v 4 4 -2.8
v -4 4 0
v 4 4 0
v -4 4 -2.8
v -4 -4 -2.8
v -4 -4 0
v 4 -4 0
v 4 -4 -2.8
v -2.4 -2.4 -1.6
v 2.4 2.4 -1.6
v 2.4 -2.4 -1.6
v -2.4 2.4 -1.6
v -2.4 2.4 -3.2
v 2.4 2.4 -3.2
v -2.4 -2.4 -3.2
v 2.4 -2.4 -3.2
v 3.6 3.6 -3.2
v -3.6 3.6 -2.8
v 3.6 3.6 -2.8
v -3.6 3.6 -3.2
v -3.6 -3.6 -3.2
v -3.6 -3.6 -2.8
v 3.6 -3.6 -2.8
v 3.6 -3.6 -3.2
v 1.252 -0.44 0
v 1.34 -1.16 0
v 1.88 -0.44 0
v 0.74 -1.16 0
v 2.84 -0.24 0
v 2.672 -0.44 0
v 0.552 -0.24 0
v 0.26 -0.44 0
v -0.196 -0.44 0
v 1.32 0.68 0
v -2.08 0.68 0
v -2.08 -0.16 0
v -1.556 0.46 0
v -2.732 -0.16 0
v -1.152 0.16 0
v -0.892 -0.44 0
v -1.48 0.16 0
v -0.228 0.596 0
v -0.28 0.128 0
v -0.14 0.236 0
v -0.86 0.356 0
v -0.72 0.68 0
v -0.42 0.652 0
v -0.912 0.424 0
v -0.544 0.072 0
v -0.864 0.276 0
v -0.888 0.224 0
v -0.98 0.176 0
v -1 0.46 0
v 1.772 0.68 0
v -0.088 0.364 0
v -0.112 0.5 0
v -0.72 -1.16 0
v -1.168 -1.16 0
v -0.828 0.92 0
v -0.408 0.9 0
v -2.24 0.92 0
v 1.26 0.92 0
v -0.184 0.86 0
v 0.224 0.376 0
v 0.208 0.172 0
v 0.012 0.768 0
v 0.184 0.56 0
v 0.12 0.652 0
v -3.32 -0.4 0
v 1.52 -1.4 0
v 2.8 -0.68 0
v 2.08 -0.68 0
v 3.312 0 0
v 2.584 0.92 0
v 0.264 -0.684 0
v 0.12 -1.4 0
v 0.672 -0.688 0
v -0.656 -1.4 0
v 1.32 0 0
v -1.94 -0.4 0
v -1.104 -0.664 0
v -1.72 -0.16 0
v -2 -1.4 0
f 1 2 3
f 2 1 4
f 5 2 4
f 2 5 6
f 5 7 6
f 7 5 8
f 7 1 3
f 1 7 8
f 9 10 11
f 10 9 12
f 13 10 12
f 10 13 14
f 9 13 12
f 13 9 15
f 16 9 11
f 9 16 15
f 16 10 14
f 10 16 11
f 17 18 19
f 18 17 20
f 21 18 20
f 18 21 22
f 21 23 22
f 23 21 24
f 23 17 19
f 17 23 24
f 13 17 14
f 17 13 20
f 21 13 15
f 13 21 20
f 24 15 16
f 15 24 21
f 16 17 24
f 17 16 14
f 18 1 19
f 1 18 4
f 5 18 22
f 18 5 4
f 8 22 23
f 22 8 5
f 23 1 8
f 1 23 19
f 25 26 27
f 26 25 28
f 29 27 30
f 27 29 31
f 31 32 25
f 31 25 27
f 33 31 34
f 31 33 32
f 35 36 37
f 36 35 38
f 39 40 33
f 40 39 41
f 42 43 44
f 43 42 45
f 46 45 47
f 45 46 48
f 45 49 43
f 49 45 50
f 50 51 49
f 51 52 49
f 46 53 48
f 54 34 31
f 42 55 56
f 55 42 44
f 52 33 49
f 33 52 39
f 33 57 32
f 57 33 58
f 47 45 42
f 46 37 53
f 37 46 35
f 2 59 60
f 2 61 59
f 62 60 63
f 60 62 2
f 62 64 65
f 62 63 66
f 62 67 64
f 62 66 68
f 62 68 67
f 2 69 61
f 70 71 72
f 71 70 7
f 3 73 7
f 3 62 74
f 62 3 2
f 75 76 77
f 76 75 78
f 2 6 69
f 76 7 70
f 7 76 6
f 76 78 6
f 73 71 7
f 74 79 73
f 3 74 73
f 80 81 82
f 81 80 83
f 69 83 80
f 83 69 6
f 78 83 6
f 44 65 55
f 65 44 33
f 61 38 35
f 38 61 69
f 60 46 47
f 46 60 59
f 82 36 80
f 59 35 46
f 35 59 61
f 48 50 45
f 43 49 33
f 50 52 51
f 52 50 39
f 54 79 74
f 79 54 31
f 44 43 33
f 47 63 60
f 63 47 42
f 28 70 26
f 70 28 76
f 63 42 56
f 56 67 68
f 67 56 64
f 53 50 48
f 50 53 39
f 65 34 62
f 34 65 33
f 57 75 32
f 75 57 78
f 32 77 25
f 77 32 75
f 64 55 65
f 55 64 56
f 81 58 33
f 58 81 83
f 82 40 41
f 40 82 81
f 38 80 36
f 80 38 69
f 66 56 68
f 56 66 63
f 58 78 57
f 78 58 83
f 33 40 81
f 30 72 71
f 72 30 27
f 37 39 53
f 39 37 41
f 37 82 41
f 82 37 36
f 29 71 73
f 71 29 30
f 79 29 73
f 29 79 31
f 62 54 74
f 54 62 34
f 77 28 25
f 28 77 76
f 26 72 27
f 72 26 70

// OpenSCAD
// file: ../p/4-4edge.scad
use <../lib.scad>
$fa=1; $fs=0.2;
function ldraw_lib__4_4edge(realsolid=false) = [
// 0 Circle 1.0
// 0 Name: 4-4edge.dat
// 0 Author: James Jessiman
// 0 !LDRAW_ORG Primitive UPDATE 2017-01
// 0 !LICENSE Licensed under CC BY 2.0 and CC BY 4.0 : see CAreadme.txt
// 
// 0 BFC CERTIFY CCW
  [0,"BFC","CERTIFY"],
  [0,"BFC","CCW"],
// 
// 0 !HISTORY 1998-12-15 [PTadmin] Official Update 1998-10
// 0 !HISTORY 2005-12-28 [PTadmin] Official Update 2005-01
// 0 !HISTORY 2007-06-24 [PTadmin] Header formatted for Contributor Agreement
// 0 !HISTORY 2008-07-01 [PTadmin] Official Update 2008-01
// 0 !HISTORY 2017-01-15 [Steffen] BFCed
// 0 !HISTORY 2017-12-30 [PTadmin] Official Update 2017-01
// 
// 
// 2 24 1 0 0 0.9239 0 0.3827
  [2,24,1,0,0,0.9239,0,0.3827],
// 2 24 0.9239 0 0.3827 0.7071 0 0.7071
  [2,24,0.9239,0,0.3827,0.7071,0,0.7071],
// 2 24 0.7071 0 0.7071 0.3827 0 0.9239
  [2,24,0.7071,0,0.7071,0.3827,0,0.9239],
// 2 24 0.3827 0 0.9239 0 0 1
  [2,24,0.3827,0,0.9239,0,0,1],
// 2 24 0 0 1 -0.3827 0 0.9239
  [2,24,0,0,1,-0.3827,0,0.9239],
// 2 24 -0.3827 0 0.9239 -0.7071 0 0.7071
  [2,24,-0.3827,0,0.9239,-0.7071,0,0.7071],
// 2 24 -0.7071 0 0.7071 -0.9239 0 0.3827
  [2,24,-0.7071,0,0.7071,-0.9239,0,0.3827],
// 2 24 -0.9239 0 0.3827 -1 0 -0
  [2,24,-0.9239,0,0.3827,-1,0,-0],
// 2 24 -1 0 -0 -0.9239 0 -0.3827
  [2,24,-1,0,-0,-0.9239,0,-0.3827],
// 2 24 -0.9239 0 -0.3827 -0.7071 0 -0.7071
  [2,24,-0.9239,0,-0.3827,-0.7071,0,-0.7071],
// 2 24 -0.7071 0 -0.7071 -0.3827 0 -0.9239
  [2,24,-0.7071,0,-0.7071,-0.3827,0,-0.9239],
// 2 24 -0.3827 0 -0.9239 0 0 -1
  [2,24,-0.3827,0,-0.9239,0,0,-1],
// 2 24 0 0 -1 0.3827 0 -0.9239
  [2,24,0,0,-1,0.3827,0,-0.9239],
// 2 24 0.3827 0 -0.9239 0.7071 0 -0.7071
  [2,24,0.3827,0,-0.9239,0.7071,0,-0.7071],
// 2 24 0.7071 0 -0.7071 0.9239 0 -0.3827
  [2,24,0.7071,0,-0.7071,0.9239,0,-0.3827],
// 2 24 0.9239 0 -0.3827 1 0 0
  [2,24,0.9239,0,-0.3827,1,0,0],
];
module ldraw_lib__4_4edge(step=0, col=false, unit=2/5, alt=false, line=0.2, solid=!$preview)
    makepoly(ldraw_lib__4_4edge(solid), step=step, col=col, unit=unit, alt=alt, line=line, solid=solid);
ldraw_lib__4_4edge(line=0.2);
// file: ../p/4-4disc.scad
use <../lib.scad>
$fa=1; $fs=0.2;
function ldraw_lib__4_4disc(realsolid=false) = [
// 0 Disc 1.0
// 0 Name: 4-4disc.dat
// 0 Author: James Jessiman
// 0 !LDRAW_ORG Primitive UPDATE 2002-02
// 0 !LICENSE Licensed under CC BY 2.0 and CC BY 4.0 : see CAreadme.txt
// 
// 0 BFC CERTIFY CCW
  [0,"BFC","CERTIFY"],
  [0,"BFC","CCW"],
// 
// 0 !HISTORY 1998-12-15 [PTadmin] Official Update 1998-10
// 0 !HISTORY 2002-03-23 [sbliss] Added BFC statement
// 0 !HISTORY 2002-04-25 [PTadmin] Official Update 2002-02
// 0 !HISTORY 2007-06-24 [PTadmin] Header formatted for Contributor Agreement
// 0 !HISTORY 2008-07-01 [PTadmin] Official Update 2008-01
// 
// 
// 3 16 0 0 0 1 0 0 0.9239 0 0.3827
  [3,16,0,0,0,1,0,0,0.9239,0,0.3827],
// 3 16 0 0 0 0.9239 0 0.3827 0.7071 0 0.7071
  [3,16,0,0,0,0.9239,0,0.3827,0.7071,0,0.7071],
// 3 16 0 0 0 0.7071 0 0.7071 0.3827 0 0.9239
  [3,16,0,0,0,0.7071,0,0.7071,0.3827,0,0.9239],
// 3 16 0 0 0 0.3827 0 0.9239 0 0 1
  [3,16,0,0,0,0.3827,0,0.9239,0,0,1],
// 3 16 0 0 0 0 0 1 -0.3827 0 0.9239
  [3,16,0,0,0,0,0,1,-0.3827,0,0.9239],
// 3 16 0 0 0 -0.3827 0 0.9239 -0.7071 0 0.7071
  [3,16,0,0,0,-0.3827,0,0.9239,-0.7071,0,0.7071],
// 3 16 0 0 0 -0.7071 0 0.7071 -0.9239 0 0.3827
  [3,16,0,0,0,-0.7071,0,0.7071,-0.9239,0,0.3827],
// 3 16 0 0 0 -0.9239 0 0.3827 -1 0 -0
  [3,16,0,0,0,-0.9239,0,0.3827,-1,0,-0],
// 3 16 0 0 0 -1 0 -0 -0.9239 0 -0.3827
  [3,16,0,0,0,-1,0,-0,-0.9239,0,-0.3827],
// 3 16 0 0 0 -0.9239 0 -0.3827 -0.7071 0 -0.7071
  [3,16,0,0,0,-0.9239,0,-0.3827,-0.7071,0,-0.7071],
// 3 16 0 0 0 -0.7071 0 -0.7071 -0.3827 0 -0.9239
  [3,16,0,0,0,-0.7071,0,-0.7071,-0.3827,0,-0.9239],
// 3 16 0 0 0 -0.3827 0 -0.9239 0 0 -1
  [3,16,0,0,0,-0.3827,0,-0.9239,0,0,-1],
// 3 16 0 0 0 0 0 -1 0.3827 0 -0.9239
  [3,16,0,0,0,0,0,-1,0.3827,0,-0.9239],
// 3 16 0 0 0 0.3827 0 -0.9239 0.7071 0 -0.7071
  [3,16,0,0,0,0.3827,0,-0.9239,0.7071,0,-0.7071],
// 3 16 0 0 0 0.7071 0 -0.7071 0.9239 0 -0.3827
  [3,16,0,0,0,0.7071,0,-0.7071,0.9239,0,-0.3827],
// 3 16 0 0 0 0.9239 0 -0.3827 1 0 0
  [3,16,0,0,0,0.9239,0,-0.3827,1,0,0],
// 0
];
module ldraw_lib__4_4disc(step=0, col=false, unit=2/5, alt=false, line=0.2, solid=!$preview)
    makepoly(ldraw_lib__4_4disc(solid), step=step, col=col, unit=unit, alt=alt, line=line, solid=solid);
ldraw_lib__4_4disc(line=0.2);
// file: ../p/4-4cyli.scad
use <../lib.scad>
$fa=1; $fs=0.2;
function ldraw_lib__4_4cyli(realsolid=false) = [
// 0 Cylinder 1.0
// 0 Name: 4-4cyli.dat
// 0 Author: James Jessiman
// 0 !LDRAW_ORG Primitive UPDATE 2005-01
// 0 !LICENSE Licensed under CC BY 2.0 and CC BY 4.0 : see CAreadme.txt
// 
// 0 BFC CERTIFY CCW
  [0,"BFC","CERTIFY"],
  [0,"BFC","CCW"],
// 
// 0 !HISTORY 1998-12-15 [PTadmin] Official Update 1998-10
// 0 !HISTORY 2002-03-23 [sbliss] Added BFC statement; merged headers from files in distributions LDraw 0.27 and Complete.
// 0 !HISTORY 2002-04-25 [PTadmin] Official Update 2002-02
// 0 !HISTORY 2004-12-14 [guyvivan] BFC CCW
// 0 !HISTORY 2005-12-28 [PTadmin] Official Update 2005-01
// 0 !HISTORY 2007-06-24 [PTadmin] Header formatted for Contributor Agreement
// 0 !HISTORY 2008-07-01 [PTadmin] Official Update 2008-01
// 
// 
// 4 16 1 1 0 0.9239 1 0.3827 0.9239 0 0.3827 1 0 0
  [4,16,1,1,0,0.9239,1,0.3827,0.9239,0,0.3827,1,0,0],
// 5 24 1 0 0 1 1 0 0.9239 0 0.3827 0.9239 0 -0.3827
  [5,24,1,0,0,1,1,0,0.9239,0,0.3827,0.9239,0,-0.3827],
// 4 16 0.9239 1 0.3827 0.7071 1 0.7071 0.7071 0 0.7071 0.9239 0 0.3827
  [4,16,0.9239,1,0.3827,0.7071,1,0.7071,0.7071,0,0.7071,0.9239,0,0.3827],
// 5 24 0.9239 0 0.3827 0.9239 1 0.3827 0.7071 0 0.7071 1 0 0
  [5,24,0.9239,0,0.3827,0.9239,1,0.3827,0.7071,0,0.7071,1,0,0],
// 4 16 0.7071 1 0.7071 0.3827 1 0.9239 0.3827 0 0.9239 0.7071 0 0.7071
  [4,16,0.7071,1,0.7071,0.3827,1,0.9239,0.3827,0,0.9239,0.7071,0,0.7071],
// 5 24 0.7071 0 0.7071 0.7071 1 0.7071 0.3827 0 0.9239 0.9239 0 0.3827
  [5,24,0.7071,0,0.7071,0.7071,1,0.7071,0.3827,0,0.9239,0.9239,0,0.3827],
// 4 16 0.3827 1 0.9239 0 1 1 0 0 1 0.3827 0 0.9239
  [4,16,0.3827,1,0.9239,0,1,1,0,0,1,0.3827,0,0.9239],
// 5 24 0.3827 0 0.9239 0.3827 1 0.9239 0 0 1 0.7071 0 0.7071
  [5,24,0.3827,0,0.9239,0.3827,1,0.9239,0,0,1,0.7071,0,0.7071],
// 4 16 0 1 1 -0.3827 1 0.9239 -0.3827 0 0.9239 0 0 1
  [4,16,0,1,1,-0.3827,1,0.9239,-0.3827,0,0.9239,0,0,1],
// 5 24 0 0 1 0 1 1 -0.3827 0 0.9239 0.3827 0 0.9239
  [5,24,0,0,1,0,1,1,-0.3827,0,0.9239,0.3827,0,0.9239],
// 4 16 -0.3827 1 0.9239 -0.7071 1 0.7071 -0.7071 0 0.7071 -0.3827 0 0.9239
  [4,16,-0.3827,1,0.9239,-0.7071,1,0.7071,-0.7071,0,0.7071,-0.3827,0,0.9239],
// 5 24 -0.3827 0 0.9239 -0.3827 1 0.9239 -0.7071 0 0.7071 0 0 1
  [5,24,-0.3827,0,0.9239,-0.3827,1,0.9239,-0.7071,0,0.7071,0,0,1],
// 4 16 -0.7071 1 0.7071 -0.9239 1 0.3827 -0.9239 0 0.3827 -0.7071 0 0.7071
  [4,16,-0.7071,1,0.7071,-0.9239,1,0.3827,-0.9239,0,0.3827,-0.7071,0,0.7071],
// 5 24 -0.7071 0 0.7071 -0.7071 1 0.7071 -0.9239 0 0.3827 -0.3827 0 0.9239
  [5,24,-0.7071,0,0.7071,-0.7071,1,0.7071,-0.9239,0,0.3827,-0.3827,0,0.9239],
// 4 16 -0.9239 1 0.3827 -1 1 0 -1 0 0 -0.9239 0 0.3827
  [4,16,-0.9239,1,0.3827,-1,1,0,-1,0,0,-0.9239,0,0.3827],
// 5 24 -0.9239 0 0.3827 -0.9239 1 0.3827 -1 0 0 -0.7071 0 0.7071
  [5,24,-0.9239,0,0.3827,-0.9239,1,0.3827,-1,0,0,-0.7071,0,0.7071],
// 4 16 -1 1 0 -0.9239 1 -0.3827 -0.9239 0 -0.3827 -1 0 0
  [4,16,-1,1,0,-0.9239,1,-0.3827,-0.9239,0,-0.3827,-1,0,0],
// 5 24 -1 0 0 -1 1 0 -0.9239 0 -0.3827 -0.9239 0 0.3827
  [5,24,-1,0,0,-1,1,0,-0.9239,0,-0.3827,-0.9239,0,0.3827],
// 4 16 -0.9239 1 -0.3827 -0.7071 1 -0.7071 -0.7071 0 -0.7071 -0.9239 0 -0.3827
  [4,16,-0.9239,1,-0.3827,-0.7071,1,-0.7071,-0.7071,0,-0.7071,-0.9239,0,-0.3827],
// 5 24 -0.9239 0 -0.3827 -0.9239 1 -0.3827 -0.7071 0 -0.7071 -1 0 0
  [5,24,-0.9239,0,-0.3827,-0.9239,1,-0.3827,-0.7071,0,-0.7071,-1,0,0],
// 4 16 -0.7071 1 -0.7071 -0.3827 1 -0.9239 -0.3827 0 -0.9239 -0.7071 0 -0.7071
  [4,16,-0.7071,1,-0.7071,-0.3827,1,-0.9239,-0.3827,0,-0.9239,-0.7071,0,-0.7071],
// 5 24 -0.7071 0 -0.7071 -0.7071 1 -0.7071 -0.3827 0 -0.9239 -0.9239 0 -0.3827
  [5,24,-0.7071,0,-0.7071,-0.7071,1,-0.7071,-0.3827,0,-0.9239,-0.9239,0,-0.3827],
// 4 16 -0.3827 1 -0.9239 0 1 -1 0 0 -1 -0.3827 0 -0.9239
  [4,16,-0.3827,1,-0.9239,0,1,-1,0,0,-1,-0.3827,0,-0.9239],
// 5 24 -0.3827 0 -0.9239 -0.3827 1 -0.9239 0 0 -1 -0.7071 0 -0.7071
  [5,24,-0.3827,0,-0.9239,-0.3827,1,-0.9239,0,0,-1,-0.7071,0,-0.7071],
// 4 16 0 1 -1 0.3827 1 -0.9239 0.3827 0 -0.9239 0 0 -1
  [4,16,0,1,-1,0.3827,1,-0.9239,0.3827,0,-0.9239,0,0,-1],
// 5 24 0 0 -1 0 1 -1 0.3827 0 -0.9239 -0.3827 0 -0.9239
  [5,24,0,0,-1,0,1,-1,0.3827,0,-0.9239,-0.3827,0,-0.9239],
// 4 16 0.3827 1 -0.9239 0.7071 1 -0.7071 0.7071 0 -0.7071 0.3827 0 -0.9239
  [4,16,0.3827,1,-0.9239,0.7071,1,-0.7071,0.7071,0,-0.7071,0.3827,0,-0.9239],
// 5 24 0.3827 0 -0.9239 0.3827 1 -0.9239 0.7071 0 -0.7071 0 0 -1
  [5,24,0.3827,0,-0.9239,0.3827,1,-0.9239,0.7071,0,-0.7071,0,0,-1],
// 4 16 0.7071 1 -0.7071 0.9239 1 -0.3827 0.9239 0 -0.3827 0.7071 0 -0.7071
  [4,16,0.7071,1,-0.7071,0.9239,1,-0.3827,0.9239,0,-0.3827,0.7071,0,-0.7071],
// 5 24 0.7071 0 -0.7071 0.7071 1 -0.7071 0.9239 0 -0.3827 0.3827 0 -0.9239
  [5,24,0.7071,0,-0.7071,0.7071,1,-0.7071,0.9239,0,-0.3827,0.3827,0,-0.9239],
// 4 16 0.9239 1 -0.3827 1 1 0 1 0 0 0.9239 0 -0.3827
  [4,16,0.9239,1,-0.3827,1,1,0,1,0,0,0.9239,0,-0.3827],
// 5 24 0.9239 0 -0.3827 0.9239 1 -0.3827 1 0 0 0.7071 0 -0.7071
  [5,24,0.9239,0,-0.3827,0.9239,1,-0.3827,1,0,0,0.7071,0,-0.7071],
// 0
];
module ldraw_lib__4_4cyli(step=0, col=false, unit=2/5, alt=false, line=0.2, solid=!$preview)
    makepoly(ldraw_lib__4_4cyli(solid), step=step, col=col, unit=unit, alt=alt, line=line, solid=solid);
ldraw_lib__4_4cyli(line=0.2);
// file: ../p/stud3.scad
use <../lib.scad>
use <4-4cyli.scad>
use <4-4disc.scad>
use <4-4edge.scad>
$fa=1; $fs=0.2;
function ldraw_lib__stud3(realsolid=false) = realsolid ? 
    [openscad(translate([0,0,-eps()], o=cylinder(4+eps(), r=4)),2)] : [
// 0 Stud Tube Solid
// 0 Name: stud3.dat
// 0 Author: James Jessiman
// 0 !LDRAW_ORG Primitive UPDATE 2012-01
// 0 !LICENSE Licensed under CC BY 2.0 and CC BY 4.0 : see CAreadme.txt
// 
// 0 BFC CERTIFY CCW
  [0,"BFC","CERTIFY"],
  [0,"BFC","CCW"],
// 
// 0 !HISTORY 2002-04-04 [sbliss] Modified for BFC compliance
// 0 !HISTORY 2002-04-25 [PTadmin] Official Update 2002-02
// 0 !HISTORY 2007-06-24 [PTadmin] Header formatted for Contributor Agreement
// 0 !HISTORY 2008-07-01 [PTadmin] Official Update 2008-01
// 0 !HISTORY 2012-02-16 [Philo] Changed to CCW
// 0 !HISTORY 2012-03-30 [PTadmin] Official Update 2012-01
// 
// 
// 1 16 0 -4 0 4 0 0 0 1 0 0 0 4 4-4edge.dat
  [1,16,0,-4,0,4,0,0,0,1,0,0,0,4, ldraw_lib__4_4edge(realsolid)],
// 1 16 0 0 0 4 0 0 0 1 0 0 0 4 4-4edge.dat
  [1,16,0,0,0,4,0,0,0,1,0,0,0,4, ldraw_lib__4_4edge(realsolid)],
// 1 16 0 -4 0 4 0 0 0 1 0 0 0 4 4-4disc.dat
  [1,16,0,-4,0,4,0,0,0,1,0,0,0,4, ldraw_lib__4_4disc(realsolid)],
// 1 16 0 -4 0 4 0 0 0 4 0 0 0 4 4-4cyli.dat
  [1,16,0,-4,0,4,0,0,0,4,0,0,0,4, ldraw_lib__4_4cyli(realsolid)],
];
module ldraw_lib__stud3(step=0, col=false, unit=2/5, alt=false, line=0.2, solid=!$preview)
    makepoly(ldraw_lib__stud3(solid), step=step, col=col, unit=unit, alt=alt, line=line, solid=solid);
ldraw_lib__stud3(line=0.2);
// file: ../p/stud.scad
use <../lib.scad>
use <4-4cyli.scad>
use <4-4disc.scad>
use <4-4edge.scad>
$fa=1; $fs=0.2;
function ldraw_lib__stud(realsolid=false) = realsolid ? 
    [openscad(translate([0,0,-eps()], o=cylinder(4+eps(), r=6)),2)] : [
// 0 Stud
// 0 Name: stud.dat
// 0 Author: James Jessiman
// 0 !LDRAW_ORG Primitive UPDATE 2012-01
// 0 !LICENSE Licensed under CC BY 2.0 and CC BY 4.0 : see CAreadme.txt
// 
// 0 BFC CERTIFY CCW
  [0,"BFC","CERTIFY"],
  [0,"BFC","CCW"],
// 
// 0 !HISTORY 2002-04-04 [sbliss] Modified for BFC compliance
// 0 !HISTORY 2002-04-25 [PTadmin] Official Update 2002-02
// 0 !HISTORY 2007-06-24 [PTadmin] Header formatted for Contributor Agreement
// 0 !HISTORY 2008-07-01 [PTadmin] Official Update 2008-01
// 0 !HISTORY 2012-02-16 [Philo] Changed to CCW
// 0 !HISTORY 2012-03-30 [PTadmin] Official Update 2012-01
// 
// 
// 1 16 0 0 0 6 0 0 0 1 0 0 0 6 4-4edge.dat
  [1,16,0,0,0,6,0,0,0,1,0,0,0,6, ldraw_lib__4_4edge(realsolid)],
// 1 16 0 -4 0 6 0 0 0 1 0 0 0 6 4-4edge.dat
  [1,16,0,-4,0,6,0,0,0,1,0,0,0,6, ldraw_lib__4_4edge(realsolid)],
// 1 16 0 0 0 6 0 0 0 -4 0 0 0 6 4-4cyli.dat
  [1,16,0,0,0,6,0,0,0,-4,0,0,0,6, ldraw_lib__4_4cyli(realsolid)],
// 1 16 0 -4 0 6 0 0 0 1 0 0 0 6 4-4disc.dat
  [1,16,0,-4,0,6,0,0,0,1,0,0,0,6, ldraw_lib__4_4disc(realsolid)],
];
module ldraw_lib__stud(step=0, col=false, unit=2/5, alt=false, line=0.2, solid=!$preview)
    makepoly(ldraw_lib__stud(solid), step=step, col=col, unit=unit, alt=alt, line=line, solid=solid);
ldraw_lib__stud(line=0.2);
// file: ../p/box4t.scad
use <../lib.scad>
$fa=1; $fs=0.2;
function ldraw_lib__box4t(realsolid=false) = [
// 0 Box with 4 Adjacent Faces and All Edges
// 0 Name: box4t.dat
// 0 Author: Tore Eriksson [Tore_Eriksson]
// 0 !LDRAW_ORG Primitive UPDATE 2003-02
// 0 !LICENSE Licensed under CC BY 2.0 and CC BY 4.0 : see CAreadme.txt
// 
// 0 BFC CERTIFY CCW
  [0,"BFC","CERTIFY"],
  [0,"BFC","CCW"],
// 
// 0 !HISTORY 1997-09-29 [PTadmin] Official Update 1997-15
// 0 !HISTORY 2002-08-31 [izanette] Modified with WINDZ for BFC compliance
// 0 !HISTORY 2003-08-01 [PTadmin] Official Update 2003-02
// 0 !HISTORY 2007-06-24 [PTadmin] Header formatted for Contributor Agreement
// 0 !HISTORY 2008-07-01 [PTadmin] Official Update 2008-01
// 
// 
// 2 24 1 1 1 -1 1 1
  [2,24,1,1,1,-1,1,1],
// 2 24 -1 1 1 -1 1 -1
  [2,24,-1,1,1,-1,1,-1],
// 2 24 -1 1 -1 1 1 -1
  [2,24,-1,1,-1,1,1,-1],
// 2 24 1 1 -1 1 1 1
  [2,24,1,1,-1,1,1,1],
// 2 24 1 0 1 -1 0 1
  [2,24,1,0,1,-1,0,1],
// 2 24 -1 0 1 -1 0 -1
  [2,24,-1,0,1,-1,0,-1],
// 2 24 -1 0 -1 1 0 -1
  [2,24,-1,0,-1,1,0,-1],
// 2 24 1 0 -1 1 0 1
  [2,24,1,0,-1,1,0,1],
// 2 24 1 0 1 1 1 1
  [2,24,1,0,1,1,1,1],
// 2 24 -1 0 1 -1 1 1
  [2,24,-1,0,1,-1,1,1],
// 2 24 1 0 -1 1 1 -1
  [2,24,1,0,-1,1,1,-1],
// 2 24 -1 0 -1 -1 1 -1
  [2,24,-1,0,-1,-1,1,-1],
// 4 16 1 1 1 1 1 -1 -1 1 -1 -1 1 1
  [4,16,1,1,1,1,1,-1,-1,1,-1,-1,1,1],
// 4 16 1 1 1 -1 1 1 -1 0 1 1 0 1
  [4,16,1,1,1,-1,1,1,-1,0,1,1,0,1],
// 4 16 -1 1 1 -1 1 -1 -1 0 -1 -1 0 1
  [4,16,-1,1,1,-1,1,-1,-1,0,-1,-1,0,1],
// 0 4 16 -1 1 -1 -1 0 -1 1 0 -1 1 1 -1
// 4 16 1 1 -1 1 1 1 1 0 1 1 0 -1
  [4,16,1,1,-1,1,1,1,1,0,1,1,0,-1],
// 0
];
module ldraw_lib__box4t(step=0, col=false, unit=2/5, alt=false, line=0.2, solid=!$preview)
    makepoly(ldraw_lib__box4t(solid), step=step, col=col, unit=unit, alt=alt, line=line, solid=solid);
ldraw_lib__box4t(line=0.2);
// file: s/3004s01.scad
use <../../lib.scad>
use <../../p/box4t.scad>
use <../../p/box5.scad>
use <../../p/stud.scad>
use <../../p/stud3.scad>
$fa=1; $fs=0.2;
function ldraw_lib__s__3004s01(realsolid=false) = [
// 0 ~Brick  1 x  2 without Front Face
// 0 Name: s\3004s01.dat
// 0 Author: James Jessiman
// 0 !LDRAW_ORG Subpart UPDATE 2003-03
// 0 !LICENSE Licensed under CC BY 2.0 and CC BY 4.0 : see CAreadme.txt
// 
// 0 BFC CERTIFY CCW
  [0,"BFC","CERTIFY"],
  [0,"BFC","CCW"],
// 
// 0 !HISTORY 2003-09-07 [jriley] Subfiling, BFC
// 0 !HISTORY 2003-12-19 [PTadmin] Official Update 2003-03
// 0 !HISTORY 2007-08-29 [PTadmin] Header formatted for Contributor Agreement
// 0 !HISTORY 2008-07-01 [PTadmin] Official Update 2008-01
// 
// 
// 1 16 0 4 0 1 0 0 0 -5 0 0 0 1 stud3.dat
  [1,16,0,4,0,1,0,0,0,-5,0,0,0,1, ldraw_lib__stud3(realsolid)],
// 0 BFC INVERTNEXT
  [0,"BFC","INVERTNEXT"],
// 1 16 0 24 0 16 0 0 0 -20 0 0 0 6 box5.dat
  [1,16,0,24,0,16,0,0,0,-20,0,0,0,6, ldraw_lib__box5(realsolid)],
// 4 16 20 24 10 16 24 6 -16 24 6 -20 24 10
  [4,16,20,24,10,16,24,6,-16,24,6,-20,24,10],
// 4 16 -20 24 10 -16 24 6 -16 24 -6 -20 24 -10
  [4,16,-20,24,10,-16,24,6,-16,24,-6,-20,24,-10],
// 4 16 -20 24 -10 -16 24 -6 16 24 -6 20 24 -10
  [4,16,-20,24,-10,-16,24,-6,16,24,-6,20,24,-10],
// 4 16 20 24 -10 16 24 -6 16 24 6 20 24 10
  [4,16,20,24,-10,16,24,-6,16,24,6,20,24,10],
// 1 16 0 24 0 20 0 0 0 -24 0 0 0 10 box4t.dat
  [1,16,0,24,0,20,0,0,0,-24,0,0,0,10, ldraw_lib__box4t(realsolid)],
// 1 16 10 0 0 1 0 0 0 1 0 0 0 1 stud.dat
  [1,16,10,0,0,1,0,0,0,1,0,0,0,1, ldraw_lib__stud(realsolid)],
// 1 16 -10 0 0 1 0 0 0 1 0 0 0 1 stud.dat
  [1,16,-10,0,0,1,0,0,0,1,0,0,0,1, ldraw_lib__stud(realsolid)],
// 0
];
module ldraw_lib__s__3004s01(step=0, col=false, unit=2/5, alt=false, line=0.2, solid=!$preview)
    makepoly(ldraw_lib__s__3004s01(solid), step=step, col=col, unit=unit, alt=alt, line=line, solid=solid);
ldraw_lib__s__3004s01(line=0.2);
// file: ../p/box5.scad
use <../lib.scad>
$fa=1; $fs=0.2;
function ldraw_lib__box5(realsolid=false) = [
// 0 Box with 5 Faces and All Edges
// 0 Name: box5.dat
// 0 Author: James Jessiman
// 0 !LDRAW_ORG Primitive UPDATE 2012-01
// 0 !LICENSE Licensed under CC BY 2.0 and CC BY 4.0 : see CAreadme.txt
// 
// 0 BFC CERTIFY CCW
  [0,"BFC","CERTIFY"],
  [0,"BFC","CCW"],
// 
// 0 !HISTORY 2002-04-03 [sbliss] Modified for BFC compliance
// 0 !HISTORY 2002-04-25 [PTadmin] Official Update 2002-02
// 0 !HISTORY 2007-06-24 [PTadmin] Header formatted for Contributor Agreement
// 0 !HISTORY 2008-07-01 [PTadmin] Official Update 2008-01
// 0 !HISTORY 2012-02-16 [Philo] Changed to CCW
// 0 !HISTORY 2012-03-30 [PTadmin] Official Update 2012-01
// 
// 
// 2 24 1 1 1 -1 1 1
  [2,24,1,1,1,-1,1,1],
// 2 24 -1 1 1 -1 1 -1
  [2,24,-1,1,1,-1,1,-1],
// 2 24 -1 1 -1 1 1 -1
  [2,24,-1,1,-1,1,1,-1],
// 2 24 1 1 -1 1 1 1
  [2,24,1,1,-1,1,1,1],
// 2 24 1 0 1 -1 0 1
  [2,24,1,0,1,-1,0,1],
// 2 24 -1 0 1 -1 0 -1
  [2,24,-1,0,1,-1,0,-1],
// 2 24 -1 0 -1 1 0 -1
  [2,24,-1,0,-1,1,0,-1],
// 2 24 1 0 -1 1 0 1
  [2,24,1,0,-1,1,0,1],
// 2 24 1 0 1 1 1 1
  [2,24,1,0,1,1,1,1],
// 2 24 -1 0 1 -1 1 1
  [2,24,-1,0,1,-1,1,1],
// 2 24 1 0 -1 1 1 -1
  [2,24,1,0,-1,1,1,-1],
// 2 24 -1 0 -1 -1 1 -1
  [2,24,-1,0,-1,-1,1,-1],
// 4 16 -1 1 1 1 1 1 1 1 -1 -1 1 -1
  [4,16,-1,1,1,1,1,1,1,1,-1,-1,1,-1],
// 4 16 -1 1 1 -1 0 1 1 0 1 1 1 1
  [4,16,-1,1,1,-1,0,1,1,0,1,1,1,1],
// 4 16 -1 1 -1 -1 0 -1 -1 0 1 -1 1 1
  [4,16,-1,1,-1,-1,0,-1,-1,0,1,-1,1,1],
// 4 16 1 1 -1 1 0 -1 -1 0 -1 -1 1 -1
  [4,16,1,1,-1,1,0,-1,-1,0,-1,-1,1,-1],
// 4 16 1 1 1 1 0 1 1 0 -1 1 1 -1
  [4,16,1,1,1,1,0,1,1,0,-1,1,1,-1],
];
module ldraw_lib__box5(step=0, col=false, unit=2/5, alt=false, line=0.2, solid=!$preview)
    makepoly(ldraw_lib__box5(solid), step=step, col=col, unit=unit, alt=alt, line=line, solid=solid);
ldraw_lib__box5(line=0.2);
// file: ../p/box4.scad
use <../lib.scad>
$fa=1; $fs=0.2;
function ldraw_lib__box4(realsolid=false) = [
// 0 Box with 4 Faces (2 Parallel Pairs) and All Edges
// 0 Name: box4.dat
// 0 Author: James Jessiman
// 0 !LDRAW_ORG Primitive UPDATE 2012-01
// 0 !LICENSE Licensed under CC BY 2.0 and CC BY 4.0 : see CAreadme.txt
// 
// 0 BFC CERTIFY CCW
  [0,"BFC","CERTIFY"],
  [0,"BFC","CCW"],
// 
// 0 !HISTORY 2002-04-03 [sbliss] Modified for BFC compliance
// 0 !HISTORY 2002-04-25 [PTadmin] Official Update 2002-02
// 0 !HISTORY 2007-06-24 [PTadmin] Header formatted for Contributor Agreement
// 0 !HISTORY 2008-07-01 [PTadmin] Official Update 2008-01
// 0 !HISTORY 2012-02-16 [Philo] Changed to CCW
// 0 !HISTORY 2012-03-30 [PTadmin] Official Update 2012-01
// 
// 
// 2 24 1 1 1 -1 1 1
  [2,24,1,1,1,-1,1,1],
// 2 24 -1 1 1 -1 1 -1
  [2,24,-1,1,1,-1,1,-1],
// 2 24 -1 1 -1 1 1 -1
  [2,24,-1,1,-1,1,1,-1],
// 2 24 1 1 -1 1 1 1
  [2,24,1,1,-1,1,1,1],
// 2 24 1 0 1 -1 0 1
  [2,24,1,0,1,-1,0,1],
// 2 24 -1 0 1 -1 0 -1
  [2,24,-1,0,1,-1,0,-1],
// 2 24 -1 0 -1 1 0 -1
  [2,24,-1,0,-1,1,0,-1],
// 2 24 1 0 -1 1 0 1
  [2,24,1,0,-1,1,0,1],
// 2 24 1 0 1 1 1 1
  [2,24,1,0,1,1,1,1],
// 2 24 -1 0 1 -1 1 1
  [2,24,-1,0,1,-1,1,1],
// 2 24 1 0 -1 1 1 -1
  [2,24,1,0,-1,1,1,-1],
// 2 24 -1 0 -1 -1 1 -1
  [2,24,-1,0,-1,-1,1,-1],
// 4 16 -1 1 1 -1 0 1 1 0 1 1 1 1
  [4,16,-1,1,1,-1,0,1,1,0,1,1,1,1],
// 4 16 -1 1 -1 -1 0 -1 -1 0 1 -1 1 1
  [4,16,-1,1,-1,-1,0,-1,-1,0,1,-1,1,1],
// 4 16 1 1 -1 1 0 -1 -1 0 -1 -1 1 -1
  [4,16,1,1,-1,1,0,-1,-1,0,-1,-1,1,-1],
// 4 16 1 1 1 1 0 1 1 0 -1 1 1 -1
  [4,16,1,1,1,1,0,1,1,0,-1,1,1,-1],
];
module ldraw_lib__box4(step=0, col=false, unit=2/5, alt=false, line=0.2, solid=!$preview)
    makepoly(ldraw_lib__box4(solid), step=step, col=col, unit=unit, alt=alt, line=line, solid=solid);
ldraw_lib__box4(line=0.2);
// file: 3004.scad
use <../lib.scad>
use <s/3004s01.scad>
$fa=1; $fs=0.2;
function ldraw_lib__3004(realsolid=false) = [
// 0 Brick  1 x  2
// 0 Name: 3004.dat
// 0 Author: James Jessiman
// 0 !LDRAW_ORG Part UPDATE 2022-05
// 0 !LICENSE Licensed under CC BY 2.0 and CC BY 4.0 : see CAreadme.txt
// 
// 0 BFC CERTIFY CCW
  [0,"BFC","CERTIFY"],
  [0,"BFC","CCW"],
// 
// 0 !HISTORY 2001-10-26 [PTadmin] Official Update 2001-01
// 0 !HISTORY 2002-05-07 {unknown} BFC Certification
// 0 !HISTORY 2002-06-11 [PTadmin] Official Update 2002-03
// 0 !HISTORY 2007-05-07 [PTadmin] Header formatted for Contributor Agreement
// 0 !HISTORY 2008-07-01 [PTadmin] Official Update 2008-01
// 0 !HISTORY 2022-08-04 [MagFors] Using subfile
// 0 !HISTORY 2022-09-15 [PTadmin] Official Update 2022-05
// 
// 
// 1 16 0 0 0 1 0 0 0 1 0 0 0 1 s\3004s01.dat
  [1,16,0,0,0,1,0,0,0,1,0,0,0,1, ldraw_lib__s__3004s01(realsolid)],
// 4 16 -20 24 -10 20 24 -10 20 0 -10 -20 0 -10
  [4,16,-20,24,-10,20,24,-10,20,0,-10,-20,0,-10],
];
module ldraw_lib__3004(step=0, col=false, unit=2/5, alt=false, line=0.2, solid=!$preview)
    makepoly(ldraw_lib__3004(solid), step=step, col=col, unit=unit, alt=alt, line=line, solid=solid);
ldraw_lib__3004(line=0.2);
// file: s/3070bs01.scad
use <../../lib.scad>
use <../../p/box4.scad>
use <../../p/box5.scad>
$fa=1; $fs=0.2;
function ldraw_lib__s__3070bs01(realsolid=false) = [
// 0 ~Tile  1 x  1 with Groove without Top Face
// 0 Name: s\3070bs01.dat
// 0 Author: Chris Dee [cwdee]
// 0 !LDRAW_ORG Subpart UPDATE 2009-02
// 0 !LICENSE Licensed under CC BY 2.0 and CC BY 4.0 : see CAreadme.txt
// 
// 0 BFC CERTIFY CCW
  [0,"BFC","CERTIFY"],
  [0,"BFC","CCW"],
// 
// 0 !HISTORY 2009-09-03 [PTadmin] Official Update 2009-02
// 
// 
// 1 16 0 0 0 10 0 0 0 7 0 0 0 10 box4.dat
  [1,16,0,0,0,10,0,0,0,7,0,0,0,10, ldraw_lib__box4(realsolid)],
// 0 BFC INVERTNEXT
  [0,"BFC","INVERTNEXT"],
// 1 16 0 8 0 6 0 0 0 -4 0 0 0 6 box5.dat
  [1,16,0,8,0,6,0,0,0,-4,0,0,0,6, ldraw_lib__box5(realsolid)],
// 1 16 0 7 0 9 0 0 0 1 0 0 0 9 box4.dat
  [1,16,0,7,0,9,0,0,0,1,0,0,0,9, ldraw_lib__box4(realsolid)],
// 
// 4 16 9 8 9 6 8 6 -6 8 6 -9 8 9
  [4,16,9,8,9,6,8,6,-6,8,6,-9,8,9],
// 4 16 -9 8 9 -6 8 6 -6 8 -6 -9 8 -9
  [4,16,-9,8,9,-6,8,6,-6,8,-6,-9,8,-9],
// 4 16 -9 8 -9 -6 8 -6 6 8 -6 9 8 -9
  [4,16,-9,8,-9,-6,8,-6,6,8,-6,9,8,-9],
// 4 16 9 8 -9 6 8 -6 6 8 6 9 8 9
  [4,16,9,8,-9,6,8,-6,6,8,6,9,8,9],
// 
// 4 16 10 7 10 9 7 9 -9 7 9 -10 7 10
  [4,16,10,7,10,9,7,9,-9,7,9,-10,7,10],
// 4 16 -10 7 10 -9 7 9 -9 7 -9 -10 7 -10
  [4,16,-10,7,10,-9,7,9,-9,7,-9,-10,7,-10],
// 4 16 -10 7 -10 -9 7 -9 9 7 -9 10 7 -10
  [4,16,-10,7,-10,-9,7,-9,9,7,-9,10,7,-10],
// 4 16 10 7 -10 9 7 -9 9 7 9 10 7 10
  [4,16,10,7,-10,9,7,-9,9,7,9,10,7,10],
// 0
];
module ldraw_lib__s__3070bs01(step=0, col=false, unit=2/5, alt=false, line=0.2, solid=!$preview)
    makepoly(ldraw_lib__s__3070bs01(solid), step=step, col=col, unit=unit, alt=alt, line=line, solid=solid);
ldraw_lib__s__3070bs01(line=0.2);
// main file
use <../lib.scad>
use <s/3070bs01.scad>
$fa=1; $fs=0.2;
function ldraw_lib__3070bp0b(realsolid=false) = [
// 0 Tile  1 x  1 with "R/T" Pattern
// 0 Name: 3070bp0b.dat
// 0 Author: Magnus Forsberg [MagFors]
// 0 !LDRAW_ORG Part UPDATE 2019-01
// 0 !LICENSE Licensed under CC BY 2.0 and CC BY 4.0 : see CAreadme.txt
// 
// 0 BFC CERTIFY CCW
  [0,"BFC","CERTIFY"],
  [0,"BFC","CCW"],
// 
// 0 !KEYWORDS Bricklink 3070bpb128, Charger, Dodge, set 75893
// 
// 0 !HISTORY 2019-06-28 [PTadmin] Official Update 2019-01
// 
// 
// 1 16 0 0 0 1 0 0 0 1 0 0 0 1 s\3070bs01.dat
  [1,16,0,0,0,1,0,0,0,1,0,0,0,1, ldraw_lib__s__3070bs01(realsolid)],
// 4 4 3.13 0 -1.1 1.85 0 -2.9 3.35 0 -2.9 4.7 0 -1.1
  [4,4,3.13,0,-1.1,1.85,0,-2.9,3.35,0,-2.9,4.7,0,-1.1],
// 4 4 4.7 0 -1.1 6.68 0 -1.1 7.1 0 -0.6 1.38 0 -0.6
  [4,4,4.7,0,-1.1,6.68,0,-1.1,7.1,0,-0.6,1.38,0,-0.6],
// 3 4 1.38 0 -0.6 0.65 0 -1.1 3.13 0 -1.1
  [3,4,1.38,0,-0.6,0.65,0,-1.1,3.13,0,-1.1],
// 3 4 1.38 0 -0.6 3.13 0 -1.1 4.7 0 -1.1
  [3,4,1.38,0,-0.6,3.13,0,-1.1,4.7,0,-1.1],
// 4 4 1.38 0 -0.6 3.3 0 1.7 -0.49 0 -1.1 0.65 0 -1.1
  [4,4,1.38,0,-0.6,3.3,0,1.7,-0.49,0,-1.1,0.65,0,-1.1],
// 4 4 -5.2 0 1.7 -6.83 0 -0.4 -5.2 0 -0.4 -3.89 0 1.15
  [4,4,-5.2,0,1.7,-6.83,0,-0.4,-5.2,0,-0.4,-3.89,0,1.15],
// 4 4 -0.49 0 -1.1 -2.88 0 0.4 -3.7 0 0.4 -2.23 0 -1.1
  [4,4,-0.49,0,-1.1,-2.88,0,0.4,-3.7,0,0.4,-2.23,0,-1.1],
// 4 4 -2.15 0 0.89 -0.7 0 0.32 -0.35 0 0.59 -0.57 0 1.49
  [4,4,-2.15,0,0.89,-0.7,0,0.32,-0.35,0,0.59,-0.57,0,1.49],
// 4 4 -2.15 0 0.89 -1.05 0 1.63 -1.8 0 1.7 -2.28 0 1.06
  [4,4,-2.15,0,0.89,-1.05,0,1.63,-1.8,0,1.7,-2.28,0,1.06],
// 4 4 -2.15 0 0.89 -2.16 0 0.69 -1.36 0 0.18 -0.7 0 0.32
  [4,4,-2.15,0,0.89,-2.16,0,0.69,-1.36,0,0.18,-0.7,0,0.32],
// 3 4 -2.16 0 0.69 -2.22 0 0.56 -1.36 0 0.18
  [3,4,-2.16,0,0.69,-2.22,0,0.56,-1.36,0,0.18],
// 3 4 -2.22 0 0.56 -2.45 0 0.44 -1.36 0 0.18
  [3,4,-2.22,0,0.56,-2.45,0,0.44,-1.36,0,0.18],
// 3 4 -1.8 0 1.7 -2.5 0 1.15 -2.28 0 1.06
  [3,4,-1.8,0,1.7,-2.5,0,1.15,-2.28,0,1.06],
// 3 4 4.43 0 1.7 3.3 0 1.7 1.38 0 -0.6
  [3,4,4.43,0,1.7,3.3,0,1.7,1.38,0,-0.6],
// 4 4 -0.22 0 0.91 -0.28 0 1.25 -0.57 0 1.49 -0.35 0 0.59
  [4,4,-0.22,0,0.91,-0.28,0,1.25,-0.57,0,1.49,-0.35,0,0.59],
// 4 4 -2.45 0 0.44 -2.88 0 0.4 -0.49 0 -1.1 -1.36 0 0.18
  [4,4,-2.45,0,0.44,-2.88,0,0.4,-0.49,0,-1.1,-1.36,0,0.18],
// 4 4 -2.92 0 -2.9 -1.8 0 -2.9 0.65 0 -1.1 -0.49 0 -1.1
  [4,4,-2.92,0,-2.9,-1.8,0,-2.9,0.65,0,-1.1,-0.49,0,-1.1],
// 3 4 -1.05 0 1.63 -2.15 0 0.89 -0.57 0 1.49
  [3,4,-1.05,0,1.63,-2.15,0,0.89,-0.57,0,1.49],
// 4 4 -5.2 0 1.7 -3.89 0 1.15 -2.5 0 1.15 -1.8 0 1.7
  [4,4,-5.2,0,1.7,-3.89,0,1.15,-2.5,0,1.15,-1.8,0,1.7],
// 3 16 -10 0 10 -2.07 0 2.3 -1.02 0 2.25
  [3,16,-10,0,10,-2.07,0,2.3,-1.02,0,2.25],
// 3 16 -10 0 10 -5.6 0 2.3 -2.07 0 2.3
  [3,16,-10,0,10,-5.6,0,2.3,-2.07,0,2.3],
// 4 16 -10 0 10 -1.02 0 2.25 -0.46 0 2.15 3.15 0 2.3
  [4,16,-10,0,10,-1.02,0,2.25,-0.46,0,2.15,3.15,0,2.3],
// 3 16 3.15 0 2.3 0.56 0 0.94 0.52 0 0.43
  [3,16,3.15,0,2.3,0.56,0,0.94,0.52,0,0.43],
// 3 16 3.15 0 2.3 -0.46 0 2.15 0.03 0 1.92
  [3,16,3.15,0,2.3,-0.46,0,2.15,0.03,0,1.92],
// 3 16 3.15 0 2.3 0.46 0 1.4 0.56 0 0.94
  [3,16,3.15,0,2.3,0.46,0,1.4,0.56,0,0.94],
// 3 16 3.15 0 2.3 0.03 0 1.92 0.3 0 1.63
  [3,16,3.15,0,2.3,0.03,0,1.92,0.3,0,1.63],
// 3 16 3.15 0 2.3 0.3 0 1.63 0.46 0 1.4
  [3,16,3.15,0,2.3,0.3,0,1.63,0.46,0,1.4],
// 3 16 -10 0 10 -8.3 0 -1 -5.6 0 2.3
  [3,16,-10,0,10,-8.3,0,-1,-5.6,0,2.3],
// 4 16 3.8 0 -3.5 10 0 -10 7 0 -1.7 5.2 0 -1.7
  [4,16,3.8,0,-3.5,10,0,-10,7,0,-1.7,5.2,0,-1.7],
// 3 16 10 0 10 8.28 0 0 10 0 -10
  [3,16,10,0,10,8.28,0,0,10,0,-10],
// 4 16 3.15 0 2.3 6.46 0 2.3 10 0 10 -10 0 10
  [4,16,3.15,0,2.3,6.46,0,2.3,10,0,10,-10,0,10],
// 4 16 0.3 0 -3.5 1.68 0 -1.72 0.66 0 -1.71 -1.64 0 -3.5
  [4,16,0.3,0,-3.5,1.68,0,-1.72,0.66,0,-1.71,-1.64,0,-3.5],
// 3 16 -10 0 10 -10 0 -10 -8.3 0 -1
  [3,16,-10,0,10,-10,0,-10,-8.3,0,-1],
// 4 16 10 0 -10 3.8 0 -3.5 0.3 0 -3.5 -10 0 -10
  [4,16,10,0,-10,3.8,0,-3.5,0.3,0,-3.5,-10,0,-10],
// 3 16 0.3 0 -3.5 -1.64 0 -3.5 -10 0 -10
  [3,16,0.3,0,-3.5,-1.64,0,-3.5,-10,0,-10],
// 3 16 8.28 0 0 7 0 -1.7 10 0 -10
  [3,16,8.28,0,0,7,0,-1.7,10,0,-10],
// 3 16 6.46 0 2.3 3.3 0 0 8.28 0 0
  [3,16,6.46,0,2.3,3.3,0,0,8.28,0,0],
// 3 16 10 0 10 6.46 0 2.3 8.28 0 0
  [3,16,10,0,10,6.46,0,2.3,8.28,0,0],
// 4 16 -4.85 0 -1 -5 0 -3.5 -2.76 0 -1.66 -4.3 0 -0.4
  [4,16,-4.85,0,-1,-5,0,-3.5,-2.76,0,-1.66,-4.3,0,-0.4],
// 4 16 -8.3 0 -1 -10 0 -10 -5 0 -3.5 -4.85 0 -1
  [4,16,-8.3,0,-1,-10,0,-10,-5,0,-3.5,-4.85,0,-1],
// 3 16 -1.64 0 -3.5 -5 0 -3.5 -10 0 -10
  [3,16,-1.64,0,-3.5,-5,0,-3.5,-10,0,-10],
// 4 80 -0.35 0 0.59 -0.49 0 -1.1 0.52 0 0.43 -0.22 0 0.91
  [4,80,-0.35,0,0.59,-0.49,0,-1.1,0.52,0,0.43,-0.22,0,0.91],
// 4 80 -6.83 0 -0.4 -5.2 0 1.7 -5.6 0 2.3 -8.3 0 -1
  [4,80,-6.83,0,-0.4,-5.2,0,1.7,-5.6,0,2.3,-8.3,0,-1],
// 4 80 -1.8 0 1.7 -1.05 0 1.63 -1.02 0 2.25 -2.07 0 2.3
  [4,80,-1.8,0,1.7,-1.05,0,1.63,-1.02,0,2.25,-2.07,0,2.3],
// 3 80 -4.3 0 -0.4 -5.2 0 -0.4 -4.85 0 -1
  [3,80,-4.3,0,-0.4,-5.2,0,-0.4,-4.85,0,-1],
// 4 80 -5.2 0 1.7 -1.8 0 1.7 -2.07 0 2.3 -5.6 0 2.3
  [4,80,-5.2,0,1.7,-1.8,0,1.7,-2.07,0,2.3,-5.6,0,2.3],
// 3 80 -2.28 0 1.06 -2.16 0 0.69 -2.15 0 0.89
  [3,80,-2.28,0,1.06,-2.16,0,0.69,-2.15,0,0.89],
// 3 80 -0.7 0 0.32 -1.36 0 0.18 -0.49 0 -1.1
  [3,80,-0.7,0,0.32,-1.36,0,0.18,-0.49,0,-1.1],
// 4 80 -2.22 0 0.56 -2.16 0 0.69 -2.88 0 0.4 -2.45 0 0.44
  [4,80,-2.22,0,0.56,-2.16,0,0.69,-2.88,0,0.4,-2.45,0,0.44],
// 4 80 3.3 0 0 6.46 0 2.3 4.43 0 1.7 1.38 0 -0.6
  [4,80,3.3,0,0,6.46,0,2.3,4.43,0,1.7,1.38,0,-0.6],
// 3 80 -0.35 0 0.59 -0.7 0 0.32 -0.49 0 -1.1
  [3,80,-0.35,0,0.59,-0.7,0,0.32,-0.49,0,-1.1],
// 4 80 -0.46 0 2.15 -1.02 0 2.25 -1.05 0 1.63 -0.57 0 1.49
  [4,80,-0.46,0,2.15,-1.02,0,2.25,-1.05,0,1.63,-0.57,0,1.49],
// 4 80 1.85 0 -2.9 0.3 0 -3.5 3.8 0 -3.5 3.35 0 -2.9
  [4,80,1.85,0,-2.9,0.3,0,-3.5,3.8,0,-3.5,3.35,0,-2.9],
// 3 80 -0.46 0 2.15 -0.57 0 1.49 -0.28 0 1.25
  [3,80,-0.46,0,2.15,-0.57,0,1.49,-0.28,0,1.25],
// 4 80 -0.28 0 1.25 0.56 0 0.94 0.46 0 1.4 0.3 0 1.63
  [4,80,-0.28,0,1.25,0.56,0,0.94,0.46,0,1.4,0.3,0,1.63],
// 4 80 -2.28 0 1.06 -2.5 0 1.15 -2.88 0 0.4 -2.16 0 0.69
  [4,80,-2.28,0,1.06,-2.5,0,1.15,-2.88,0,0.4,-2.16,0,0.69],
// 4 80 3.3 0 1.7 3.15 0 2.3 0.52 0 0.43 -0.49 0 -1.1
  [4,80,3.3,0,1.7,3.15,0,2.3,0.52,0,0.43,-0.49,0,-1.1],
// 4 80 -1.8 0 -2.9 -1.64 0 -3.5 0.66 0 -1.71 0.65 0 -1.1
  [4,80,-1.8,0,-2.9,-1.64,0,-3.5,0.66,0,-1.71,0.65,0,-1.1],
// 4 80 0.66 0 -1.71 1.68 0 -1.72 3.13 0 -1.1 0.65 0 -1.1
  [4,80,0.66,0,-1.71,1.68,0,-1.72,3.13,0,-1.1,0.65,0,-1.1],
// 4 80 0.56 0 0.94 -0.28 0 1.25 -0.22 0 0.91 0.52 0 0.43
  [4,80,0.56,0,0.94,-0.28,0,1.25,-0.22,0,0.91,0.52,0,0.43],
// 4 80 -2.76 0 -1.66 -5 0 -3.5 -2.92 0 -2.9 -0.49 0 -1.1
  [4,80,-2.76,0,-1.66,-5,0,-3.5,-2.92,0,-2.9,-0.49,0,-1.1],
// 4 80 -4.3 0 -0.4 -2.76 0 -1.66 -2.23 0 -1.1 -3.7 0 0.4
  [4,80,-4.3,0,-0.4,-2.76,0,-1.66,-2.23,0,-1.1,-3.7,0,0.4],
// 4 80 -6.83 0 -0.4 -8.3 0 -1 -4.85 0 -1 -5.2 0 -0.4
  [4,80,-6.83,0,-0.4,-8.3,0,-1,-4.85,0,-1,-5.2,0,-0.4],
// 4 80 0.03 0 1.92 -0.46 0 2.15 -0.28 0 1.25 0.3 0 1.63
  [4,80,0.03,0,1.92,-0.46,0,2.15,-0.28,0,1.25,0.3,0,1.63],
// 4 80 -2.92 0 -2.9 -5 0 -3.5 -1.64 0 -3.5 -1.8 0 -2.9
  [4,80,-2.92,0,-2.9,-5,0,-3.5,-1.64,0,-3.5,-1.8,0,-2.9],
// 3 80 -0.49 0 -1.1 -2.23 0 -1.1 -2.76 0 -1.66
  [3,80,-0.49,0,-1.1,-2.23,0,-1.1,-2.76,0,-1.66],
// 4 80 5.2 0 -1.7 7 0 -1.7 6.68 0 -1.1 4.7 0 -1.1
  [4,80,5.2,0,-1.7,7,0,-1.7,6.68,0,-1.1,4.7,0,-1.1],
// 4 80 -3.89 0 1.15 -3.7 0 0.4 -2.88 0 0.4 -2.5 0 1.15
  [4,80,-3.89,0,1.15,-3.7,0,0.4,-2.88,0,0.4,-2.5,0,1.15],
// 4 80 -5.2 0 -0.4 -4.3 0 -0.4 -3.7 0 0.4 -3.89 0 1.15
  [4,80,-5.2,0,-0.4,-4.3,0,-0.4,-3.7,0,0.4,-3.89,0,1.15],
// 4 80 7 0 -1.7 8.28 0 0 7.1 0 -0.6 6.68 0 -1.1
  [4,80,7,0,-1.7,8.28,0,0,7.1,0,-0.6,6.68,0,-1.1],
// 4 80 7.1 0 -0.6 8.28 0 0 3.3 0 0 1.38 0 -0.6
  [4,80,7.1,0,-0.6,8.28,0,0,3.3,0,0,1.38,0,-0.6],
// 4 80 4.43 0 1.7 6.46 0 2.3 3.15 0 2.3 3.3 0 1.7
  [4,80,4.43,0,1.7,6.46,0,2.3,3.15,0,2.3,3.3,0,1.7],
// 4 80 1.68 0 -1.72 0.3 0 -3.5 1.85 0 -2.9 3.13 0 -1.1
  [4,80,1.68,0,-1.72,0.3,0,-3.5,1.85,0,-2.9,3.13,0,-1.1],
// 4 80 3.35 0 -2.9 3.8 0 -3.5 5.2 0 -1.7 4.7 0 -1.1
  [4,80,3.35,0,-2.9,3.8,0,-3.5,5.2,0,-1.7,4.7,0,-1.1],
];
module ldraw_lib__3070bp0b(step=0, col=false, unit=2/5, alt=false, line=0.2, solid=!$preview)
    makepoly(ldraw_lib__3070bp0b(solid), step=step, col=col, unit=unit, alt=alt, line=line, solid=solid);
ldraw_lib__3070bp0b(line=0.2);
